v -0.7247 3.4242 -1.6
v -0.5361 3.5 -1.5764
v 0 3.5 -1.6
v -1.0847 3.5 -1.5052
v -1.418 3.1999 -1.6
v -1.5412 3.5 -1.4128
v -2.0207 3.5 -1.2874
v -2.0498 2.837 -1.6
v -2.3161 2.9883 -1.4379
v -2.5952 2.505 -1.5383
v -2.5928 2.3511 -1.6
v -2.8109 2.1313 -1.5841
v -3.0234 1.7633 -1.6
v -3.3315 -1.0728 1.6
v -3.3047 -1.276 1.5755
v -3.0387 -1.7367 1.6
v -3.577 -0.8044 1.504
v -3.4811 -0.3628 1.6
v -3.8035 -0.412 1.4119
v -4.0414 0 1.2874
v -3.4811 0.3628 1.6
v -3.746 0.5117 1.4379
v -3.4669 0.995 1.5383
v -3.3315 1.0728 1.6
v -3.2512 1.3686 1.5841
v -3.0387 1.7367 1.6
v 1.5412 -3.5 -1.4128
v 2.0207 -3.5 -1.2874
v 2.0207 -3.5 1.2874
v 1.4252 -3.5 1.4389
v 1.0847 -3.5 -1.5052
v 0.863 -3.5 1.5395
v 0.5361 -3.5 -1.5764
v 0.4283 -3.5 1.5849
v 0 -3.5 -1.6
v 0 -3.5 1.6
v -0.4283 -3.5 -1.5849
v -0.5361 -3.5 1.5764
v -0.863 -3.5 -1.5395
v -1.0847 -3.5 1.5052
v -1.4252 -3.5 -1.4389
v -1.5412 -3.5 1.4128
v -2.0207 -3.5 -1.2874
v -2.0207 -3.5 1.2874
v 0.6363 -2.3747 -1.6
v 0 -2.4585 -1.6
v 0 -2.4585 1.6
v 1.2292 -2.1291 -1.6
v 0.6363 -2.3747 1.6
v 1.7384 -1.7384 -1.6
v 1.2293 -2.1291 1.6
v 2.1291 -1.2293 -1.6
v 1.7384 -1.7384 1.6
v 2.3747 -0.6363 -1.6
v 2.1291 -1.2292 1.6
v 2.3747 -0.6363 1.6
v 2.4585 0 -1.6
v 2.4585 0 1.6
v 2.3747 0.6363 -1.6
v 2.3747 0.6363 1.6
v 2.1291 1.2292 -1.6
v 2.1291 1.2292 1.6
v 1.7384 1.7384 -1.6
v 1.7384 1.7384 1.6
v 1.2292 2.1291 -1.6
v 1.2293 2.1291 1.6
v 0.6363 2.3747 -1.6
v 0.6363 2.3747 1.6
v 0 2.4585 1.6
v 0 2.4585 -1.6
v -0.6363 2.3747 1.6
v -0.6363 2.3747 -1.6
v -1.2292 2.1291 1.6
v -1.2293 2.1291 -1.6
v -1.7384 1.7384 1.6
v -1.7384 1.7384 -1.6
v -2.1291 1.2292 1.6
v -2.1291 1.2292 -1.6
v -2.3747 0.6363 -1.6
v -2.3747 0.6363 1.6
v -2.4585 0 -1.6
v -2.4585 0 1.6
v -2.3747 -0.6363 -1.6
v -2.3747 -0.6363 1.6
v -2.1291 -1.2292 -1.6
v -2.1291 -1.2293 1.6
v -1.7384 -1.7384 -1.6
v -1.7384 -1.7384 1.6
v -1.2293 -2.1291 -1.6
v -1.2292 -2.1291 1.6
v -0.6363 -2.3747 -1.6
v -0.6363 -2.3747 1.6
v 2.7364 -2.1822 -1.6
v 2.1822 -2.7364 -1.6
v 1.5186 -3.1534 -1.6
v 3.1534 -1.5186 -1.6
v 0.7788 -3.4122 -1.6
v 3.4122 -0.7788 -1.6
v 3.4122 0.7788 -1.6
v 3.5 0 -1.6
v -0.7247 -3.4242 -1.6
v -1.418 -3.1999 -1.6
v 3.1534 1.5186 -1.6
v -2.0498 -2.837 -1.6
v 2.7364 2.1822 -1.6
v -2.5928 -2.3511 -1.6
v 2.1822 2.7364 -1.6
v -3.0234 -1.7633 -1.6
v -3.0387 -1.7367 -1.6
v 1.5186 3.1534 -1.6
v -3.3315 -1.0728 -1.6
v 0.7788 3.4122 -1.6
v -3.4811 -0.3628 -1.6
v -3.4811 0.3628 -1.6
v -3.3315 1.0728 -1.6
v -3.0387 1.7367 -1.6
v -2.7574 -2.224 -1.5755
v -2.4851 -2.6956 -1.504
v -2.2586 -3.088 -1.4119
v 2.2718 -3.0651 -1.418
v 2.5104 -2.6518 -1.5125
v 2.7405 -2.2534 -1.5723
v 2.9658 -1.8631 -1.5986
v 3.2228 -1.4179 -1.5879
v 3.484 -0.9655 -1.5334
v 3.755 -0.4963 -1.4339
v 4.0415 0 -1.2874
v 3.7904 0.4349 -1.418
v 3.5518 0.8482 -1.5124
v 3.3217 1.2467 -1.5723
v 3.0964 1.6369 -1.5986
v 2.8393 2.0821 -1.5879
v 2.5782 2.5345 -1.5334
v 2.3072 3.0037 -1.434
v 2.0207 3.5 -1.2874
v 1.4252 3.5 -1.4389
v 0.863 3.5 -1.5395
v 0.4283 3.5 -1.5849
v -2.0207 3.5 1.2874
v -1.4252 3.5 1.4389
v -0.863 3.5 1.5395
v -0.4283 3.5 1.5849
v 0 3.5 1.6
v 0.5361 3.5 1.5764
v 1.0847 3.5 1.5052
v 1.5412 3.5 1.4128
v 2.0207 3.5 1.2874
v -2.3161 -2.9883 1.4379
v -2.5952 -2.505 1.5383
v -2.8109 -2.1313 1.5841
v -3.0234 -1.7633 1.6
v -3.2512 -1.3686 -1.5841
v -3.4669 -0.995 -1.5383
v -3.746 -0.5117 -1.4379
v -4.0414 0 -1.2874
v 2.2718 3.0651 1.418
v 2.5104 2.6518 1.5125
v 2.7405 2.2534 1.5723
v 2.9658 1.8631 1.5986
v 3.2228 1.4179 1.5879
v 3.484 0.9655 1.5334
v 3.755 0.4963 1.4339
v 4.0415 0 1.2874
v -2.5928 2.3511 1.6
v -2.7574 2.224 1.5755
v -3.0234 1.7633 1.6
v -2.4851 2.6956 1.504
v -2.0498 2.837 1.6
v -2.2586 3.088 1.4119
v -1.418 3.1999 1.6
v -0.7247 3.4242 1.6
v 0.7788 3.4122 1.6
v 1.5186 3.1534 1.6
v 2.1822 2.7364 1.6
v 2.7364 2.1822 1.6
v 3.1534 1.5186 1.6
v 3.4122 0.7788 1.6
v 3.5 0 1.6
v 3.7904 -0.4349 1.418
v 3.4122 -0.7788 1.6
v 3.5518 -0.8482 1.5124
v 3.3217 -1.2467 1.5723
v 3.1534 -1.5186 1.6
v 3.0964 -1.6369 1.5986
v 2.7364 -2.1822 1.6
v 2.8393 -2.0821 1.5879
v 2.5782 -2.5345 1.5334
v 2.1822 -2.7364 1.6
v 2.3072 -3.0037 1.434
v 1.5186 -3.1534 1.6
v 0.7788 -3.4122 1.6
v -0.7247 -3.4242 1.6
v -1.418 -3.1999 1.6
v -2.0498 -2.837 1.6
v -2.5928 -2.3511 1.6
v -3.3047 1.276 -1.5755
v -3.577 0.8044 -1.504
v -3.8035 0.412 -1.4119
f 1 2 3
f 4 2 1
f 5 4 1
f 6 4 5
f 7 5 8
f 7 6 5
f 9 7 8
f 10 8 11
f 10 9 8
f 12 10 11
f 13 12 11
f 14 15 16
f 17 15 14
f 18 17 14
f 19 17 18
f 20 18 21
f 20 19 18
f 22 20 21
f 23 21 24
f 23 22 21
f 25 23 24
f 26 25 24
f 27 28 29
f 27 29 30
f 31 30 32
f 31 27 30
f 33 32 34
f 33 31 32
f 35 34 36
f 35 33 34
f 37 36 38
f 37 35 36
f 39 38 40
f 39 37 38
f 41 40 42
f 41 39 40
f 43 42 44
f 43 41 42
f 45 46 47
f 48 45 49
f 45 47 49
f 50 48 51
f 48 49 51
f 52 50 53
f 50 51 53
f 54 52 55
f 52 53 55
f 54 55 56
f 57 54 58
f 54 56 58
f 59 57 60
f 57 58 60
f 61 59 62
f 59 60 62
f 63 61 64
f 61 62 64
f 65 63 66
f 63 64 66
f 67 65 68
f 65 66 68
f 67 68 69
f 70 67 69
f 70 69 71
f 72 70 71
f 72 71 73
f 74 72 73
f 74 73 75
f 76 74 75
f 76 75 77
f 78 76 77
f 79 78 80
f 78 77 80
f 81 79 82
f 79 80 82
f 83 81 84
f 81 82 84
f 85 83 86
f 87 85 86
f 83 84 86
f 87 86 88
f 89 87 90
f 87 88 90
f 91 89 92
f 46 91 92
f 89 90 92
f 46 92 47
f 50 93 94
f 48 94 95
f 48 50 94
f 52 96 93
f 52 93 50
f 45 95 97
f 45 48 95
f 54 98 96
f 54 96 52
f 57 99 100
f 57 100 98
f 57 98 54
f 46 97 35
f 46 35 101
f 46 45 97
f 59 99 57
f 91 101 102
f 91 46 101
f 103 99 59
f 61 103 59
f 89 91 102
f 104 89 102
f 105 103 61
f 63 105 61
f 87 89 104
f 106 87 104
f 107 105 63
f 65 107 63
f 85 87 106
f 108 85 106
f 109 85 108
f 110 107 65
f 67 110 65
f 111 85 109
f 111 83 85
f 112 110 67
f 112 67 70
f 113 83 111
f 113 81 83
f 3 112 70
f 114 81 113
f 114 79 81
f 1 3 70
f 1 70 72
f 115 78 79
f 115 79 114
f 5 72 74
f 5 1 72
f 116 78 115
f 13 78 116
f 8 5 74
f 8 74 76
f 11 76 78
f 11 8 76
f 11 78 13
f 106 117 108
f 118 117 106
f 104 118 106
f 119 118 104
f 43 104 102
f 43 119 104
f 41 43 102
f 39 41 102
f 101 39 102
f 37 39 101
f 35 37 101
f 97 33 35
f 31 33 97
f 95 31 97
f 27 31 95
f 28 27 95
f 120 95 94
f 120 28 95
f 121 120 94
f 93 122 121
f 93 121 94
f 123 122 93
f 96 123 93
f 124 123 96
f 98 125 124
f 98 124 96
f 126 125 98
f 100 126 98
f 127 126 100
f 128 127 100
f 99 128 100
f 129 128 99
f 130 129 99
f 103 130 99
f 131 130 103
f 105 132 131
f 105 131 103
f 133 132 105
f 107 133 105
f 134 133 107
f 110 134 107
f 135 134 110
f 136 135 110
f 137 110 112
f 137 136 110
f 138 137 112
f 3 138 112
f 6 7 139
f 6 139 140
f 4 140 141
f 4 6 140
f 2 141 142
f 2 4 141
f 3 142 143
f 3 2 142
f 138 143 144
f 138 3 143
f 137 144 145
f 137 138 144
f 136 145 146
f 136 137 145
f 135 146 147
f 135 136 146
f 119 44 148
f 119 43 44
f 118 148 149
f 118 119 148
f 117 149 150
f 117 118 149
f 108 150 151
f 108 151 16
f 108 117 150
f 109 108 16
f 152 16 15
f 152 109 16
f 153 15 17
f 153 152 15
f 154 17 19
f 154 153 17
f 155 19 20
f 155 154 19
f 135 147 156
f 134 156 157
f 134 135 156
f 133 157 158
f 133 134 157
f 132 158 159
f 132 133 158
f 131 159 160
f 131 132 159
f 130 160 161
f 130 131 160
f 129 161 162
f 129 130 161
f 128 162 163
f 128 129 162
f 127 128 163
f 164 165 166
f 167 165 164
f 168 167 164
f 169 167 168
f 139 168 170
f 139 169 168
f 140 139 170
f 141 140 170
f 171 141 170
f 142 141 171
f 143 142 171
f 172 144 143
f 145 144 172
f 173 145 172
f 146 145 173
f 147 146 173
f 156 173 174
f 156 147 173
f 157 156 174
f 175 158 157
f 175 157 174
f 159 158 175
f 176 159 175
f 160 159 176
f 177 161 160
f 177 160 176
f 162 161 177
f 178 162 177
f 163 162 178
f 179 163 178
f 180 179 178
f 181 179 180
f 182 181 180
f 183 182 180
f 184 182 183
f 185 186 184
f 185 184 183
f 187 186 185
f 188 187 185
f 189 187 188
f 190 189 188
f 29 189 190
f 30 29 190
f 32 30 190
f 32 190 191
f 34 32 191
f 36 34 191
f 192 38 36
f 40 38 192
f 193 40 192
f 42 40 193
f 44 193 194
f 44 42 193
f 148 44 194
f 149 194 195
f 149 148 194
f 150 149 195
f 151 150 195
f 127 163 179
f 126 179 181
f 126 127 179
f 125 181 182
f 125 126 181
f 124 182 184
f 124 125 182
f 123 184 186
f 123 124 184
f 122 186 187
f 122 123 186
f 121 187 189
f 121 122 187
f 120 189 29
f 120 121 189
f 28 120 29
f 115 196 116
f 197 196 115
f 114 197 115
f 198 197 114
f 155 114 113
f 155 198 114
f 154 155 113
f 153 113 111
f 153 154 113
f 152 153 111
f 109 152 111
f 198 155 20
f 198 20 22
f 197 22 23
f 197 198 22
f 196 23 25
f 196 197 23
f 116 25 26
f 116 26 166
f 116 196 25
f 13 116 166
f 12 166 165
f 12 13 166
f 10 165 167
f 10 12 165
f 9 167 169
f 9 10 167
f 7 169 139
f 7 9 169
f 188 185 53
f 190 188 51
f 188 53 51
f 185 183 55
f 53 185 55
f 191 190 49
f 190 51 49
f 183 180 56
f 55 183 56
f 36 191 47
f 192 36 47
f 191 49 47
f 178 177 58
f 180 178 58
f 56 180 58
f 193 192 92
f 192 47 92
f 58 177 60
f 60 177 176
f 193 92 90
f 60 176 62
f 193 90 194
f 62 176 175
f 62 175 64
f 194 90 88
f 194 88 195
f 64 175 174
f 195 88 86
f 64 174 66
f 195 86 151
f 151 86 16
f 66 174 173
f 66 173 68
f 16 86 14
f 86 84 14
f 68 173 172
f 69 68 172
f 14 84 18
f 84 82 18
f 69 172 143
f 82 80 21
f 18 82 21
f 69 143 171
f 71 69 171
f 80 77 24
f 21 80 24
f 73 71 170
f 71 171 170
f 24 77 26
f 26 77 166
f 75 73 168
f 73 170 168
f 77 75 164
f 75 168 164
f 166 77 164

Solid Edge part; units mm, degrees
sketch "Sketch1" plane through (10.8674, 10.8674, 0) normal (0, 0, 1) x (1, 0, 0)
  line L0 (-14.9088, -10.8674) -> (-12.8881, -7.3674)
  line L1 (-12.8881, -7.3674) -> (-8.8467, -7.3674)
  line L2 (-8.8467, -7.3674) -> (-6.8259, -10.8674)
  line L3 (-6.8259, -10.8674) -> (-8.8467, -14.3674)
  line L4 (-8.8467, -14.3674) -> (-12.8881, -14.3674)
  line L5 (-12.8881, -14.3674) -> (-14.9088, -10.8674)
  dimension "D1" = 7
extrude "Protrusion1" add sketch "Sketch1" along normal mid plane 3.2
sketch "Sketch2" plane through (0, 8.3963, 8.3963) normal (1, 0, 0) x (0, 1, 0)
  line L0 (-11.8963, -6.7963) -> (-14.6675, -8.3963)
  line L1 (-14.6675, -8.3963) -> (-11.8963, -9.9963)
revolve "RevolvedCutout1" cut sketch "Sketch2" angle 360 about axis through (0, 0, 1.6) along (0, 0, -1) material side at (0, -4.9106, 0.8433)
hole "Hål_M6" at (0, 0, 1.6) direction (0, 0, -1) diameter 4.917 end up to next
properties material "Iron"
